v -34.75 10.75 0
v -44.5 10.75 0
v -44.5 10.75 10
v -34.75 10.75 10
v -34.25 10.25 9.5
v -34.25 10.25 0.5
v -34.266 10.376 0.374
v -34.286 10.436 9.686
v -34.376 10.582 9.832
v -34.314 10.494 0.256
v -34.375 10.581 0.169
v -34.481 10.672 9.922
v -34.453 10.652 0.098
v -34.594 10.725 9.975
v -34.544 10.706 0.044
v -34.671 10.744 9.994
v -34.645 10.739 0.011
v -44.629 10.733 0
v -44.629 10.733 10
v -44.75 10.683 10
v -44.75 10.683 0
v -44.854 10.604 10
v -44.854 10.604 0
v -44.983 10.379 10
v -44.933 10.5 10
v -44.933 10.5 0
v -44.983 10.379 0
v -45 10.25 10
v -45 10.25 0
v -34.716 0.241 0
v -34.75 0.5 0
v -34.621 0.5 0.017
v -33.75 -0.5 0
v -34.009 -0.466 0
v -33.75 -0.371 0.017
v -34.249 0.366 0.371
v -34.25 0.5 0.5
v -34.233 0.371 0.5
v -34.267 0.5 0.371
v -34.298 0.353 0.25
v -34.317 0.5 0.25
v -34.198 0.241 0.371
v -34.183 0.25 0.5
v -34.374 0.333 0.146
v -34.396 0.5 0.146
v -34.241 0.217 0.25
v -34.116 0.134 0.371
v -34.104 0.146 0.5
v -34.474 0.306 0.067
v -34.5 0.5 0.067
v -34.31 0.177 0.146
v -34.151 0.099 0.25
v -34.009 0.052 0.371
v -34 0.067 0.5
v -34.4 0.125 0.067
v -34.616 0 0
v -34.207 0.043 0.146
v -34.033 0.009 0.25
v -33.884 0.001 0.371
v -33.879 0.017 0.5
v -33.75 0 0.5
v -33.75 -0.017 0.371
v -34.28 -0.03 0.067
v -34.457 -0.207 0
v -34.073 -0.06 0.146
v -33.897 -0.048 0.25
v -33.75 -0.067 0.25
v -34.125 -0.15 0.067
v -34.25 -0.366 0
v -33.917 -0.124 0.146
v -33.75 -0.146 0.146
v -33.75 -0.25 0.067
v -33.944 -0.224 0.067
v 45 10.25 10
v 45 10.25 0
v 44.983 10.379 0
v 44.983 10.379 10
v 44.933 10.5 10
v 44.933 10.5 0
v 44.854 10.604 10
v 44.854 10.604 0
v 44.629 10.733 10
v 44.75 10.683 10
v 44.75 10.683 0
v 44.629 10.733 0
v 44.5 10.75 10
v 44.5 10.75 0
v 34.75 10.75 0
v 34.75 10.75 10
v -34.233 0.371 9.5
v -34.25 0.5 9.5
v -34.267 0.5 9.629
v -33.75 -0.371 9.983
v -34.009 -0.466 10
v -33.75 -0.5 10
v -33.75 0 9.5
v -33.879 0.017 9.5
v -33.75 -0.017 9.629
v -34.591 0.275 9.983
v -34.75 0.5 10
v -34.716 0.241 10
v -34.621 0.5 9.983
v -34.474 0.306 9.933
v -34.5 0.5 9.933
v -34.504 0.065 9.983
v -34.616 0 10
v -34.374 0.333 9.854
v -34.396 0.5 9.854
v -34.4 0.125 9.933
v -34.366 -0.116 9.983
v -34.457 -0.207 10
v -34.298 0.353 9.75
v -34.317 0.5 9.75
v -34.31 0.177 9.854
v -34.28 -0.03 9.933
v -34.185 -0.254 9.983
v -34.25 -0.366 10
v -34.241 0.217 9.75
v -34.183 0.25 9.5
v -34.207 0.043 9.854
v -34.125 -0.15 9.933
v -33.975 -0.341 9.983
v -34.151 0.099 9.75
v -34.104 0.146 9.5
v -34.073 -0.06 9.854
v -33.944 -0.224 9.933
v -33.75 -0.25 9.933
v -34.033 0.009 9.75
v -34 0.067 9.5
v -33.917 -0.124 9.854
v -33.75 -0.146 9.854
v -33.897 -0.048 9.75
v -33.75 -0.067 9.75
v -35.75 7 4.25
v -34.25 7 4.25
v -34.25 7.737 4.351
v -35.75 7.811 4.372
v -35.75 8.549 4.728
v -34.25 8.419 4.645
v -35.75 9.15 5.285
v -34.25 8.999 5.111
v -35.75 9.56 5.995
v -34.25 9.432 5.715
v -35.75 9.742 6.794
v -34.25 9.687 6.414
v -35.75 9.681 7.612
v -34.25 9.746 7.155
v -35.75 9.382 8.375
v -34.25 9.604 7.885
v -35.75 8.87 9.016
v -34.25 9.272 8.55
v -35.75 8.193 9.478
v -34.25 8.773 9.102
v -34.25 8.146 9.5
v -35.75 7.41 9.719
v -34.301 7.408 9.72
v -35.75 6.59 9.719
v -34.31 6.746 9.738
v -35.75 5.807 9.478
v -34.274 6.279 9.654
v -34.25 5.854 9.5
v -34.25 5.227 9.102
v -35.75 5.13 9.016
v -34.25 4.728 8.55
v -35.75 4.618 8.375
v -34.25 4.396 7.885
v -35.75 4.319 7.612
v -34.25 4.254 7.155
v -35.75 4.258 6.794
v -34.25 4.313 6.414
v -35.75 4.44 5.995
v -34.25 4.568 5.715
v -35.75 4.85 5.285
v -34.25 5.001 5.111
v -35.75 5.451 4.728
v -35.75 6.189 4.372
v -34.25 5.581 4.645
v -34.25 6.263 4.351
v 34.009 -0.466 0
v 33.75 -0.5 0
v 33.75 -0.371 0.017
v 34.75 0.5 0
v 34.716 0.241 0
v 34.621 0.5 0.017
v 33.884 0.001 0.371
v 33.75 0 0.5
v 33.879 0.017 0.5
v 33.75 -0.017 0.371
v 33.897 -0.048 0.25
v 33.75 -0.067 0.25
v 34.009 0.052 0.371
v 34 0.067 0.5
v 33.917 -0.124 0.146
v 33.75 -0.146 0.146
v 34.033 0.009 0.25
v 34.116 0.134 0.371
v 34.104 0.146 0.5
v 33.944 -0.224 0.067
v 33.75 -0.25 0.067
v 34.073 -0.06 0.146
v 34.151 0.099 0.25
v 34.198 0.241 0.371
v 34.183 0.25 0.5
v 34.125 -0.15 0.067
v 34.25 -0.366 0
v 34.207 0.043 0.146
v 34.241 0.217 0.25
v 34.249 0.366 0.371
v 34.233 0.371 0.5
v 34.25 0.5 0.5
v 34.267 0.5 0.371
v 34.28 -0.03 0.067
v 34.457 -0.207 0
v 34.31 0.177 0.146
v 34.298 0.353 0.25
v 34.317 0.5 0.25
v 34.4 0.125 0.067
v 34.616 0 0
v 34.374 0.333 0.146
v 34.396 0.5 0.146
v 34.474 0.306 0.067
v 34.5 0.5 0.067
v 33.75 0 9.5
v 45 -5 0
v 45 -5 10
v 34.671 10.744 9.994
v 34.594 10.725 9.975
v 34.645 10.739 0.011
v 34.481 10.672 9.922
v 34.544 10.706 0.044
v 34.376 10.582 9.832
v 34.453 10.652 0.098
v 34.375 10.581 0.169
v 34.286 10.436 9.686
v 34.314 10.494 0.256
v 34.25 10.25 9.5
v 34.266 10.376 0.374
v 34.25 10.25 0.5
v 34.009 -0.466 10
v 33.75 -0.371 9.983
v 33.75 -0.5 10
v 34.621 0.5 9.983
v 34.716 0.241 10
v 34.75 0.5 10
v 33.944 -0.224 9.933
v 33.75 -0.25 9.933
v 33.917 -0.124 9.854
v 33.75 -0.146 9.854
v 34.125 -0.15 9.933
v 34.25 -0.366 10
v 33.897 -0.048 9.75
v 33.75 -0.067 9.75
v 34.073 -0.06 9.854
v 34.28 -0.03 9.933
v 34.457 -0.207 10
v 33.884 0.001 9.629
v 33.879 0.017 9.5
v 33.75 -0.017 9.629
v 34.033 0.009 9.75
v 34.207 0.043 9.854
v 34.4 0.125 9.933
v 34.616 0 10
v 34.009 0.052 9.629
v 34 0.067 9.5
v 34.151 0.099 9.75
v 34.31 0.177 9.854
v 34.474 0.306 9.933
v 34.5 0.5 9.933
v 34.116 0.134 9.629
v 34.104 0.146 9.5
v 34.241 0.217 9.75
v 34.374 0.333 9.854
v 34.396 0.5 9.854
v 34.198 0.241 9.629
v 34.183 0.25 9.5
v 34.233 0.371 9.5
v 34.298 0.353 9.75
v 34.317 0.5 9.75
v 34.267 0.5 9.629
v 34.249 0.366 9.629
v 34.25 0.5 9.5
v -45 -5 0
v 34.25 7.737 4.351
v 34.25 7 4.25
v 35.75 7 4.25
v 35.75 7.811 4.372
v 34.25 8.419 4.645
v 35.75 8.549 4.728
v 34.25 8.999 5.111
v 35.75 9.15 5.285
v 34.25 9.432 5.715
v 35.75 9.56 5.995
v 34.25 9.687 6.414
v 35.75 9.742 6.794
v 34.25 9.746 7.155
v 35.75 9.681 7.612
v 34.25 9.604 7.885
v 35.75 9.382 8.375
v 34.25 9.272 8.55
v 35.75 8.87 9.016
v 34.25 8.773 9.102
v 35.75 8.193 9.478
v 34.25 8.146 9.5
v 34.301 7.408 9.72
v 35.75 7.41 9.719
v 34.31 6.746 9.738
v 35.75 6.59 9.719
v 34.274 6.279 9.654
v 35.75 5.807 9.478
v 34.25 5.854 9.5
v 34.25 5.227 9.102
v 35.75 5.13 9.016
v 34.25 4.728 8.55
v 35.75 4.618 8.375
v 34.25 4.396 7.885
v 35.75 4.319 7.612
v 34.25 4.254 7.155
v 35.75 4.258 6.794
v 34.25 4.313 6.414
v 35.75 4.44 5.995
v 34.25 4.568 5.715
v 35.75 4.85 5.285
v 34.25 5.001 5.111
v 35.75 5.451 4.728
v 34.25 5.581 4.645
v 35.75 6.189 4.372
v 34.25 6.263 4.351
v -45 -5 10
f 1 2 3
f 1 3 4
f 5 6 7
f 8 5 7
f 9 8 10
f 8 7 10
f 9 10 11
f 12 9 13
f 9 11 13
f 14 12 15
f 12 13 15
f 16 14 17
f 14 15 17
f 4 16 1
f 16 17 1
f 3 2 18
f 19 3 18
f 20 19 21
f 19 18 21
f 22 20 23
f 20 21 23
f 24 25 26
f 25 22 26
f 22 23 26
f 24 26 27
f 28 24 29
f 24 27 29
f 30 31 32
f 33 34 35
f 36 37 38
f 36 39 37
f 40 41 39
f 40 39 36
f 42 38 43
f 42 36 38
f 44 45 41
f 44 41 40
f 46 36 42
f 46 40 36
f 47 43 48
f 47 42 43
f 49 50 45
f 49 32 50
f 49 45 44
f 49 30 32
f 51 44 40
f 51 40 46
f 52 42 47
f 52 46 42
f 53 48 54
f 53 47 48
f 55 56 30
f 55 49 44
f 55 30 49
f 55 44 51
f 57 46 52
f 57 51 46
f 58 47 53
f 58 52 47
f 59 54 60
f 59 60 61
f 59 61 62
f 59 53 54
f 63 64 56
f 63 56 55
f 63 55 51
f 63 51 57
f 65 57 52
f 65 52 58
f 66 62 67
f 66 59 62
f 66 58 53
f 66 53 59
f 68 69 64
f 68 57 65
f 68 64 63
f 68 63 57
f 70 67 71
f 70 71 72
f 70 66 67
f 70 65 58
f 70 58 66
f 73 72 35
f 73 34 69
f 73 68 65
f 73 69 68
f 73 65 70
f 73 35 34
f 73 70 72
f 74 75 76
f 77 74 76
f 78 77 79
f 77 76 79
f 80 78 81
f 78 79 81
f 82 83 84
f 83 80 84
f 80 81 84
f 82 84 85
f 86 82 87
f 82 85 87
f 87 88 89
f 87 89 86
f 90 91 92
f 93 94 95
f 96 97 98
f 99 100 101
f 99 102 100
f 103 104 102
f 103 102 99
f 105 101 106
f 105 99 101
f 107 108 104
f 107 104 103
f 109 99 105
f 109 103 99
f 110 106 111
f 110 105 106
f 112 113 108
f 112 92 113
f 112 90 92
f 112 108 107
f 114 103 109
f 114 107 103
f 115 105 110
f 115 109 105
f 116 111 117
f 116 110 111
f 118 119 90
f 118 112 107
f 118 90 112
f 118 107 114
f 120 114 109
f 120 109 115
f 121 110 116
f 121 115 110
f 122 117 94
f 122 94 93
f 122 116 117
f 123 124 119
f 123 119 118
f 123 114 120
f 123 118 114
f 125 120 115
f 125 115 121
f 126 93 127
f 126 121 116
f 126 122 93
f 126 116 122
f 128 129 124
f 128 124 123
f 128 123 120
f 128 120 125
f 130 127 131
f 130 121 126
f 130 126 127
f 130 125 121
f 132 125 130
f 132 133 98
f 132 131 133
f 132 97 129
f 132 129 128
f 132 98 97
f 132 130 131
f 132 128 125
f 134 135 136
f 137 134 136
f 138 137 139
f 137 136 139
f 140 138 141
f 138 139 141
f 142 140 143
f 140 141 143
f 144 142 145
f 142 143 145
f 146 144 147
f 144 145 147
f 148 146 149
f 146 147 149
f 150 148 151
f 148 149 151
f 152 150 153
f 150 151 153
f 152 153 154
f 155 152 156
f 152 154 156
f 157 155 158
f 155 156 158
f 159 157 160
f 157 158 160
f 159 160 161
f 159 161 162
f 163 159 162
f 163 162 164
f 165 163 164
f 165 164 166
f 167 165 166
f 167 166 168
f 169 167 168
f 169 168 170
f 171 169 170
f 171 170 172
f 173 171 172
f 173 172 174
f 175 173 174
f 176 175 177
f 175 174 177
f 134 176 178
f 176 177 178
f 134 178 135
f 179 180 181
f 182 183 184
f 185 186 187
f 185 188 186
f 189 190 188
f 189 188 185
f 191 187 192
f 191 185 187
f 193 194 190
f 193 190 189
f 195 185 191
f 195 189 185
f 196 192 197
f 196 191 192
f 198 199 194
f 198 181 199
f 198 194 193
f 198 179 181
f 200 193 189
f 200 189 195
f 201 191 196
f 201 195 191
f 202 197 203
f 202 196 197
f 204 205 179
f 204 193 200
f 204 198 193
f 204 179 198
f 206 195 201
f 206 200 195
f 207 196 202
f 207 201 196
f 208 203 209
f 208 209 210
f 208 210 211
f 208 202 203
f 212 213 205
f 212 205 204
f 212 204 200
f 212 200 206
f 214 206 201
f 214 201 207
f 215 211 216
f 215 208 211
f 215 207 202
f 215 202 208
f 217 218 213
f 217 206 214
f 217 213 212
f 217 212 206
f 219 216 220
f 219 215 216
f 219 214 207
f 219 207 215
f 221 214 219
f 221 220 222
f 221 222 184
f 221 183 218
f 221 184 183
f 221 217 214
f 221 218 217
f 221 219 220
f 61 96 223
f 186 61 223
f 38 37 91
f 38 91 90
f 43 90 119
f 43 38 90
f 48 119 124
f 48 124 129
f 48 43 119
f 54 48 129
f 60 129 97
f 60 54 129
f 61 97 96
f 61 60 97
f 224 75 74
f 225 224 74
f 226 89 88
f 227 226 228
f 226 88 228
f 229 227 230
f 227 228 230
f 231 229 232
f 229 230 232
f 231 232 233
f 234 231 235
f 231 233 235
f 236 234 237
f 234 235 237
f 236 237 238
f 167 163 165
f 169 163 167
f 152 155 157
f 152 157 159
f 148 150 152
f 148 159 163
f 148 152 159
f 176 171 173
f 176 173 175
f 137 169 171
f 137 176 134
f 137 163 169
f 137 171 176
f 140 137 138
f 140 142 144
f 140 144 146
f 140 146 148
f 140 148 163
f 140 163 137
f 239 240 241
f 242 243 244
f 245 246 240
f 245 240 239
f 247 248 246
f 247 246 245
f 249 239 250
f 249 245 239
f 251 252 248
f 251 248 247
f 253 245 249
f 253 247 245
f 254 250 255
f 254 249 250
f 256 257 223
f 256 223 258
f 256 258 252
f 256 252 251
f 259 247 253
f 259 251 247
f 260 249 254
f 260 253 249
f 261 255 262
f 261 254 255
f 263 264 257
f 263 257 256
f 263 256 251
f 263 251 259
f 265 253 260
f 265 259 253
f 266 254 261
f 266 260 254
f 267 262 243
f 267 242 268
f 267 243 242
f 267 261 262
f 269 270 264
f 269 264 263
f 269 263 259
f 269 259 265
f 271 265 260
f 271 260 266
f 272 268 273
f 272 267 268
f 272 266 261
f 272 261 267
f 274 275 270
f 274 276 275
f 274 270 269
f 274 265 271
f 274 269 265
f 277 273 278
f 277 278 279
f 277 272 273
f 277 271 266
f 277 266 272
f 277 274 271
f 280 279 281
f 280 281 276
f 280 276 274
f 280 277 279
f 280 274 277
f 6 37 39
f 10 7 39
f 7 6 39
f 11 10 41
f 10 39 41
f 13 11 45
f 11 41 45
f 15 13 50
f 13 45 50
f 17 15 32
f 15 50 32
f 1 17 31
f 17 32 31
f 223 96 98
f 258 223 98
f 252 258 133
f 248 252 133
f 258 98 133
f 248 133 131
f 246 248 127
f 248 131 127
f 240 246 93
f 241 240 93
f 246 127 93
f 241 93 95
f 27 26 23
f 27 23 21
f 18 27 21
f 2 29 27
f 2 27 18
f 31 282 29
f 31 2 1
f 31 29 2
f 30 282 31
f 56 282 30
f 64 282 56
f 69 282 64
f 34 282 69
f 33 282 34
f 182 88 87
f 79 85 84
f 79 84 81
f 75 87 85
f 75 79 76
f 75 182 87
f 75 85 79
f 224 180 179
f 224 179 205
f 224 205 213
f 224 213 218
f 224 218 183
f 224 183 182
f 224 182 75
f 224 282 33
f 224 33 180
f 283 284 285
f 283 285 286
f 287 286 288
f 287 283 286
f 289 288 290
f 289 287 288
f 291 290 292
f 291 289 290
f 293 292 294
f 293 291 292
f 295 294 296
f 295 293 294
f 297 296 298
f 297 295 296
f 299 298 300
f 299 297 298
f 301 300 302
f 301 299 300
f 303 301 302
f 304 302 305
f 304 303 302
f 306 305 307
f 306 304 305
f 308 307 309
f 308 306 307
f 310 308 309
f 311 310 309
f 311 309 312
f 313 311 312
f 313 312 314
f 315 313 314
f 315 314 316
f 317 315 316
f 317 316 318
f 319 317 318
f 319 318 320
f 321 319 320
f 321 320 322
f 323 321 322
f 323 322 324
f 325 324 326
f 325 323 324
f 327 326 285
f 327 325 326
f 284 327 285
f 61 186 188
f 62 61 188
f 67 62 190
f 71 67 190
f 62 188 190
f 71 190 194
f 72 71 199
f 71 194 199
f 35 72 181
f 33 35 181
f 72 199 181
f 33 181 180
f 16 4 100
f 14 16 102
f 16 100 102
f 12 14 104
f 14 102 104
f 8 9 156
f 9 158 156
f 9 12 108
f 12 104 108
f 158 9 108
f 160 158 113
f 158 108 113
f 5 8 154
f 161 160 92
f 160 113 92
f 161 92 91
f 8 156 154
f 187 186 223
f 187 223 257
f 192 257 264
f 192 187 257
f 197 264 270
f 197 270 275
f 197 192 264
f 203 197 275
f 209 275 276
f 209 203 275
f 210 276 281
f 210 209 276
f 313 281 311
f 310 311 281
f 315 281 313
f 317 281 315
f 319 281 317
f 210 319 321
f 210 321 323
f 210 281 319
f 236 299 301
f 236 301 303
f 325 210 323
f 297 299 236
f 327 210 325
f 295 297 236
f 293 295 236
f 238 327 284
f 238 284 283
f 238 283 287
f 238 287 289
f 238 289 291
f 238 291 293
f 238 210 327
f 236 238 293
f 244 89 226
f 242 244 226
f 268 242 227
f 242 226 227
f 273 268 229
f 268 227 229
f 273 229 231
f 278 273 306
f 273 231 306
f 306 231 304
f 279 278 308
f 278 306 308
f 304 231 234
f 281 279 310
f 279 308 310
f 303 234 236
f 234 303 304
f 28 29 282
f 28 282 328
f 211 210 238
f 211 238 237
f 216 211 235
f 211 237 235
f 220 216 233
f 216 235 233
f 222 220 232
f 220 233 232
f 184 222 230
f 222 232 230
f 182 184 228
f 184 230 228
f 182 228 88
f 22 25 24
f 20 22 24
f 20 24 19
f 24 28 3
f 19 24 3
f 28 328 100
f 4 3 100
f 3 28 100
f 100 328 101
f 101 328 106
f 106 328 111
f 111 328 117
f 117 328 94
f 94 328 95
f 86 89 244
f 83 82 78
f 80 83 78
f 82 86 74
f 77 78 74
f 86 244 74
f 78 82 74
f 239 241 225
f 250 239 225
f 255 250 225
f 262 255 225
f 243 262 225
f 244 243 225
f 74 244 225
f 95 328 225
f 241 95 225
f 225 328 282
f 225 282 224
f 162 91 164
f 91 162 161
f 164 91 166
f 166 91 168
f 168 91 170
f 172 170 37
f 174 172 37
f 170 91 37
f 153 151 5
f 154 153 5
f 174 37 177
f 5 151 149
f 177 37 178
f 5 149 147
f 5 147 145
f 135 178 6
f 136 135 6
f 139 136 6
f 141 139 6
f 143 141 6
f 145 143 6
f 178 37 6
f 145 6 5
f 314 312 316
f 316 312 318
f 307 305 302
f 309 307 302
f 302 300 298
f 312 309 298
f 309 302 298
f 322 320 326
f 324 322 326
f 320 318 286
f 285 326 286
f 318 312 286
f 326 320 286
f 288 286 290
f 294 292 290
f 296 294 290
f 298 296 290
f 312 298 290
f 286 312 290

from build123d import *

# Parameters (mm, degrees)
ESQUISSE1_W             = 10.75
ESQUISSE1_H             = 10.75
BOSS_EXTRU_1_DEPTH      = 10
BOSS_EXTRU_1_2_DEPTH    = 10
ESQUISSE3_W             = 90
ESQUISSE3_H             = 10
BOSS_EXTRU_2_DEPTH      = 5
ESQUISSE4_R             = 2.75
ENL_V_MAT_EXTRU_1_DEPTH = 1.5
CONG_1_R                = 0.5


with BuildPart() as part:
    # Esquisse1 → Boss.-Extru.1 (new body)
    with BuildSketch(Plane.XY):
        with Locations((-39.625, 5.375)):
            Rectangle(ESQUISSE1_W, ESQUISSE1_H)
    extrude(amount=BOSS_EXTRU_1_DEPTH)



with BuildPart() as body_2:
    # Esquisse1 → Boss.-Extru.1 2 (new body)
    with BuildSketch(Plane.XY):
        with Locations((39.625, 5.375)):
            Rectangle(ESQUISSE1_W, ESQUISSE1_H)
    extrude(amount=BOSS_EXTRU_1_2_DEPTH)


with BuildPart() as part_1:
    add(part.part)

    add(body_2.part)  # Boss.-Extru.2 merges body 2
    # Esquisse3 → Boss.-Extru.2 (add)
    with BuildSketch(Plane.XZ):
        with Locations((0, 5)):
            Rectangle(ESQUISSE3_W, ESQUISSE3_H)
    extrude(amount=BOSS_EXTRU_2_DEPTH)

    # Esquisse4 → Enlèv. mat.-Extru.1 (cut)
    with BuildSketch(Plane(origin=(-34.25, 0, 0), x_dir=(0, 0, -1), z_dir=(1, 0, 0))):
        with Locations((-7, 7)):
            Circle(ESQUISSE4_R)
    enl_v_mat_extru_1 = extrude(amount=-ENL_V_MAT_EXTRU_1_DEPTH, mode=Mode.SUBTRACT)

    # Symétrie1: Enlèv. mat.-Extru.1 across plane
    add(enl_v_mat_extru_1.mirror(Plane(origin=(0, 0, 0), x_dir=(0, 0, 1), z_dir=(1, 0, 0))), mode=Mode.SUBTRACT)

    # Congé1
    # the kernel refuses this fillet: 0.5 mm, written as the material it adds along each edge
    with BuildSketch(Plane(origin=(34.25, 0, 0), x_dir=(-1, 0, 0), z_dir=(0, 0, 1)), Plane(origin=(-34.25, 0, 0), x_dir=(0, 1, 0), z_dir=(0, 0, 1))) as cong_1_piece_1:
        with BuildLine():
            CenterArc((CONG_1_R, -CONG_1_R), CONG_1_R, 90, 90)
            Line((0, -CONG_1_R), (0, 0))
            Line((0, 0), (CONG_1_R, 0))
        make_face()
    extrude(amount=10)
    # the kernel refuses this fillet: 0.5 mm, written as the material it takes off along each edge
    with BuildSketch(Plane(origin=(33.75, 0, 0), x_dir=(0, -1, 0), z_dir=(-1, 0, 0)), Plane(origin=(-33.75, 0, 10), x_dir=(0, -1, 0), z_dir=(1, 0, 0))) as cong_1_2_piece_1:
        with BuildLine():
            CenterArc((CONG_1_R, CONG_1_R), CONG_1_R, 180, 90)
            Line((0, CONG_1_R), (0, 0))
            Line((0, 0), (CONG_1_R, 0))
        make_face()
    extrude(amount=67.5, mode=Mode.SUBTRACT)
    with BuildSketch(Plane(origin=(34.25, 12, 0), x_dir=(1, 0, 0), z_dir=(0, -1, 0)), Plane(origin=(-34.25, 0.5, 10), x_dir=(0, 0, -1), z_dir=(0, 1, 0))) as cong_1_2_piece_2:
        with BuildLine():
            CenterArc((CONG_1_R, CONG_1_R), CONG_1_R, 180, 90)
            Line((0, CONG_1_R), (0, 0))
            Line((0, 0), (CONG_1_R, 0))
        make_face()
    extrude(amount=11.5, mode=Mode.SUBTRACT)
    with BuildSketch(Plane(origin=(34.25, 10.75, -1.25), x_dir=(1, 0, 0), z_dir=(0, 0, 1)), Plane(origin=(45, 10.75, -1.25), x_dir=(0, -1, 0), z_dir=(0, 0, 1)), Plane(origin=(-45, 10.75, -1.25), x_dir=(1, 0, 0), z_dir=(0, 0, 1))) as cong_1_2_piece_3:
        with BuildLine():
            CenterArc((CONG_1_R, -CONG_1_R), CONG_1_R, 90, 90)
            Line((0, -CONG_1_R), (0, 0))
            Line((0, 0), (CONG_1_R, 0))
        make_face()
    extrude(amount=12.5, mode=Mode.SUBTRACT)
    with BuildSketch(Plane(origin=(34.25, 12, 10), x_dir=(1, 0, 0), z_dir=(0, -1, 0)), Plane(origin=(-34.25, 0.5, 0), x_dir=(0, 0, 1), z_dir=(0, 1, 0))) as cong_1_2_piece_4:
        with BuildLine():
            CenterArc((CONG_1_R, -CONG_1_R), CONG_1_R, 90, 90)
            Line((0, -CONG_1_R), (0, 0))
            Line((0, 0), (CONG_1_R, 0))
        make_face()
    extrude(amount=11.5, mode=Mode.SUBTRACT)
    with BuildSketch(Plane(origin=(-34.25, 10.75, -1.25), x_dir=(-1, 0, 0), z_dir=(0, 0, 1))) as cong_1_2_piece_5:
        with BuildLine():
            CenterArc((CONG_1_R, CONG_1_R), CONG_1_R, 180, 90)
            Line((0, CONG_1_R), (0, 0))
            Line((0, 0), (CONG_1_R, 0))
        make_face()
    extrude(amount=12.5, mode=Mode.SUBTRACT)
    with BuildSketch(Plane(origin=(-33.75, 0.5, 0), x_dir=(-1, 0, 0), z_dir=(0, 1, 0))) as cong_1_2_piece_6:
        with BuildLine():
            CenterArc((0.5 + CONG_1_R, CONG_1_R), CONG_1_R, 180, 90)
            Line((0.5, CONG_1_R), (0.5, 0))
            Line((0.5, 0), (0.5 + CONG_1_R, 0))
        make_face()
    revolve(axis=Axis((-33.75, 0.5, 0), (0, 0, 1)), revolution_arc=90, mode=Mode.SUBTRACT)
    with BuildSketch(Plane(origin=(-33.75, 0.5, 10), x_dir=(-1, 0, 0), z_dir=(0, 1, 0))) as cong_1_2_piece_7:
        with BuildLine():
            CenterArc((0.5 + CONG_1_R, -CONG_1_R), CONG_1_R, 90, 90)
            Line((0.5, -CONG_1_R), (0.5, 0))
            Line((0.5, 0), (0.5 + CONG_1_R, 0))
        make_face()
    revolve(axis=Axis((-33.75, 0.5, 10), (0, 0, 1)), revolution_arc=90, mode=Mode.SUBTRACT)
    with BuildSketch(Plane(origin=(33.75, 0.5, 10), x_dir=(0, -1, 0), z_dir=(-1, 0, 0))) as cong_1_2_piece_8:
        with BuildLine():
            CenterArc((0.5 + CONG_1_R, -CONG_1_R), CONG_1_R, 90, 90)
            Line((0.5, -CONG_1_R), (0.5, 0))
            Line((0.5, 0), (0.5 + CONG_1_R, 0))
        make_face()
    revolve(axis=Axis((33.75, 0.5, 10), (0, 0, 1)), revolution_arc=90, mode=Mode.SUBTRACT)
    with BuildSketch(Plane(origin=(33.75, 0.5, 0), x_dir=(0, -1, 0), z_dir=(-1, 0, 0))) as cong_1_2_piece_9:
        with BuildLine():
            CenterArc((0.5 + CONG_1_R, CONG_1_R), CONG_1_R, 180, 90)
            Line((0.5, CONG_1_R), (0.5, 0))
            Line((0.5, 0), (0.5 + CONG_1_R, 0))
        make_face()
    revolve(axis=Axis((33.75, 0.5, 0), (0, 0, 1)), revolution_arc=90, mode=Mode.SUBTRACT)


solid = part_1.part
